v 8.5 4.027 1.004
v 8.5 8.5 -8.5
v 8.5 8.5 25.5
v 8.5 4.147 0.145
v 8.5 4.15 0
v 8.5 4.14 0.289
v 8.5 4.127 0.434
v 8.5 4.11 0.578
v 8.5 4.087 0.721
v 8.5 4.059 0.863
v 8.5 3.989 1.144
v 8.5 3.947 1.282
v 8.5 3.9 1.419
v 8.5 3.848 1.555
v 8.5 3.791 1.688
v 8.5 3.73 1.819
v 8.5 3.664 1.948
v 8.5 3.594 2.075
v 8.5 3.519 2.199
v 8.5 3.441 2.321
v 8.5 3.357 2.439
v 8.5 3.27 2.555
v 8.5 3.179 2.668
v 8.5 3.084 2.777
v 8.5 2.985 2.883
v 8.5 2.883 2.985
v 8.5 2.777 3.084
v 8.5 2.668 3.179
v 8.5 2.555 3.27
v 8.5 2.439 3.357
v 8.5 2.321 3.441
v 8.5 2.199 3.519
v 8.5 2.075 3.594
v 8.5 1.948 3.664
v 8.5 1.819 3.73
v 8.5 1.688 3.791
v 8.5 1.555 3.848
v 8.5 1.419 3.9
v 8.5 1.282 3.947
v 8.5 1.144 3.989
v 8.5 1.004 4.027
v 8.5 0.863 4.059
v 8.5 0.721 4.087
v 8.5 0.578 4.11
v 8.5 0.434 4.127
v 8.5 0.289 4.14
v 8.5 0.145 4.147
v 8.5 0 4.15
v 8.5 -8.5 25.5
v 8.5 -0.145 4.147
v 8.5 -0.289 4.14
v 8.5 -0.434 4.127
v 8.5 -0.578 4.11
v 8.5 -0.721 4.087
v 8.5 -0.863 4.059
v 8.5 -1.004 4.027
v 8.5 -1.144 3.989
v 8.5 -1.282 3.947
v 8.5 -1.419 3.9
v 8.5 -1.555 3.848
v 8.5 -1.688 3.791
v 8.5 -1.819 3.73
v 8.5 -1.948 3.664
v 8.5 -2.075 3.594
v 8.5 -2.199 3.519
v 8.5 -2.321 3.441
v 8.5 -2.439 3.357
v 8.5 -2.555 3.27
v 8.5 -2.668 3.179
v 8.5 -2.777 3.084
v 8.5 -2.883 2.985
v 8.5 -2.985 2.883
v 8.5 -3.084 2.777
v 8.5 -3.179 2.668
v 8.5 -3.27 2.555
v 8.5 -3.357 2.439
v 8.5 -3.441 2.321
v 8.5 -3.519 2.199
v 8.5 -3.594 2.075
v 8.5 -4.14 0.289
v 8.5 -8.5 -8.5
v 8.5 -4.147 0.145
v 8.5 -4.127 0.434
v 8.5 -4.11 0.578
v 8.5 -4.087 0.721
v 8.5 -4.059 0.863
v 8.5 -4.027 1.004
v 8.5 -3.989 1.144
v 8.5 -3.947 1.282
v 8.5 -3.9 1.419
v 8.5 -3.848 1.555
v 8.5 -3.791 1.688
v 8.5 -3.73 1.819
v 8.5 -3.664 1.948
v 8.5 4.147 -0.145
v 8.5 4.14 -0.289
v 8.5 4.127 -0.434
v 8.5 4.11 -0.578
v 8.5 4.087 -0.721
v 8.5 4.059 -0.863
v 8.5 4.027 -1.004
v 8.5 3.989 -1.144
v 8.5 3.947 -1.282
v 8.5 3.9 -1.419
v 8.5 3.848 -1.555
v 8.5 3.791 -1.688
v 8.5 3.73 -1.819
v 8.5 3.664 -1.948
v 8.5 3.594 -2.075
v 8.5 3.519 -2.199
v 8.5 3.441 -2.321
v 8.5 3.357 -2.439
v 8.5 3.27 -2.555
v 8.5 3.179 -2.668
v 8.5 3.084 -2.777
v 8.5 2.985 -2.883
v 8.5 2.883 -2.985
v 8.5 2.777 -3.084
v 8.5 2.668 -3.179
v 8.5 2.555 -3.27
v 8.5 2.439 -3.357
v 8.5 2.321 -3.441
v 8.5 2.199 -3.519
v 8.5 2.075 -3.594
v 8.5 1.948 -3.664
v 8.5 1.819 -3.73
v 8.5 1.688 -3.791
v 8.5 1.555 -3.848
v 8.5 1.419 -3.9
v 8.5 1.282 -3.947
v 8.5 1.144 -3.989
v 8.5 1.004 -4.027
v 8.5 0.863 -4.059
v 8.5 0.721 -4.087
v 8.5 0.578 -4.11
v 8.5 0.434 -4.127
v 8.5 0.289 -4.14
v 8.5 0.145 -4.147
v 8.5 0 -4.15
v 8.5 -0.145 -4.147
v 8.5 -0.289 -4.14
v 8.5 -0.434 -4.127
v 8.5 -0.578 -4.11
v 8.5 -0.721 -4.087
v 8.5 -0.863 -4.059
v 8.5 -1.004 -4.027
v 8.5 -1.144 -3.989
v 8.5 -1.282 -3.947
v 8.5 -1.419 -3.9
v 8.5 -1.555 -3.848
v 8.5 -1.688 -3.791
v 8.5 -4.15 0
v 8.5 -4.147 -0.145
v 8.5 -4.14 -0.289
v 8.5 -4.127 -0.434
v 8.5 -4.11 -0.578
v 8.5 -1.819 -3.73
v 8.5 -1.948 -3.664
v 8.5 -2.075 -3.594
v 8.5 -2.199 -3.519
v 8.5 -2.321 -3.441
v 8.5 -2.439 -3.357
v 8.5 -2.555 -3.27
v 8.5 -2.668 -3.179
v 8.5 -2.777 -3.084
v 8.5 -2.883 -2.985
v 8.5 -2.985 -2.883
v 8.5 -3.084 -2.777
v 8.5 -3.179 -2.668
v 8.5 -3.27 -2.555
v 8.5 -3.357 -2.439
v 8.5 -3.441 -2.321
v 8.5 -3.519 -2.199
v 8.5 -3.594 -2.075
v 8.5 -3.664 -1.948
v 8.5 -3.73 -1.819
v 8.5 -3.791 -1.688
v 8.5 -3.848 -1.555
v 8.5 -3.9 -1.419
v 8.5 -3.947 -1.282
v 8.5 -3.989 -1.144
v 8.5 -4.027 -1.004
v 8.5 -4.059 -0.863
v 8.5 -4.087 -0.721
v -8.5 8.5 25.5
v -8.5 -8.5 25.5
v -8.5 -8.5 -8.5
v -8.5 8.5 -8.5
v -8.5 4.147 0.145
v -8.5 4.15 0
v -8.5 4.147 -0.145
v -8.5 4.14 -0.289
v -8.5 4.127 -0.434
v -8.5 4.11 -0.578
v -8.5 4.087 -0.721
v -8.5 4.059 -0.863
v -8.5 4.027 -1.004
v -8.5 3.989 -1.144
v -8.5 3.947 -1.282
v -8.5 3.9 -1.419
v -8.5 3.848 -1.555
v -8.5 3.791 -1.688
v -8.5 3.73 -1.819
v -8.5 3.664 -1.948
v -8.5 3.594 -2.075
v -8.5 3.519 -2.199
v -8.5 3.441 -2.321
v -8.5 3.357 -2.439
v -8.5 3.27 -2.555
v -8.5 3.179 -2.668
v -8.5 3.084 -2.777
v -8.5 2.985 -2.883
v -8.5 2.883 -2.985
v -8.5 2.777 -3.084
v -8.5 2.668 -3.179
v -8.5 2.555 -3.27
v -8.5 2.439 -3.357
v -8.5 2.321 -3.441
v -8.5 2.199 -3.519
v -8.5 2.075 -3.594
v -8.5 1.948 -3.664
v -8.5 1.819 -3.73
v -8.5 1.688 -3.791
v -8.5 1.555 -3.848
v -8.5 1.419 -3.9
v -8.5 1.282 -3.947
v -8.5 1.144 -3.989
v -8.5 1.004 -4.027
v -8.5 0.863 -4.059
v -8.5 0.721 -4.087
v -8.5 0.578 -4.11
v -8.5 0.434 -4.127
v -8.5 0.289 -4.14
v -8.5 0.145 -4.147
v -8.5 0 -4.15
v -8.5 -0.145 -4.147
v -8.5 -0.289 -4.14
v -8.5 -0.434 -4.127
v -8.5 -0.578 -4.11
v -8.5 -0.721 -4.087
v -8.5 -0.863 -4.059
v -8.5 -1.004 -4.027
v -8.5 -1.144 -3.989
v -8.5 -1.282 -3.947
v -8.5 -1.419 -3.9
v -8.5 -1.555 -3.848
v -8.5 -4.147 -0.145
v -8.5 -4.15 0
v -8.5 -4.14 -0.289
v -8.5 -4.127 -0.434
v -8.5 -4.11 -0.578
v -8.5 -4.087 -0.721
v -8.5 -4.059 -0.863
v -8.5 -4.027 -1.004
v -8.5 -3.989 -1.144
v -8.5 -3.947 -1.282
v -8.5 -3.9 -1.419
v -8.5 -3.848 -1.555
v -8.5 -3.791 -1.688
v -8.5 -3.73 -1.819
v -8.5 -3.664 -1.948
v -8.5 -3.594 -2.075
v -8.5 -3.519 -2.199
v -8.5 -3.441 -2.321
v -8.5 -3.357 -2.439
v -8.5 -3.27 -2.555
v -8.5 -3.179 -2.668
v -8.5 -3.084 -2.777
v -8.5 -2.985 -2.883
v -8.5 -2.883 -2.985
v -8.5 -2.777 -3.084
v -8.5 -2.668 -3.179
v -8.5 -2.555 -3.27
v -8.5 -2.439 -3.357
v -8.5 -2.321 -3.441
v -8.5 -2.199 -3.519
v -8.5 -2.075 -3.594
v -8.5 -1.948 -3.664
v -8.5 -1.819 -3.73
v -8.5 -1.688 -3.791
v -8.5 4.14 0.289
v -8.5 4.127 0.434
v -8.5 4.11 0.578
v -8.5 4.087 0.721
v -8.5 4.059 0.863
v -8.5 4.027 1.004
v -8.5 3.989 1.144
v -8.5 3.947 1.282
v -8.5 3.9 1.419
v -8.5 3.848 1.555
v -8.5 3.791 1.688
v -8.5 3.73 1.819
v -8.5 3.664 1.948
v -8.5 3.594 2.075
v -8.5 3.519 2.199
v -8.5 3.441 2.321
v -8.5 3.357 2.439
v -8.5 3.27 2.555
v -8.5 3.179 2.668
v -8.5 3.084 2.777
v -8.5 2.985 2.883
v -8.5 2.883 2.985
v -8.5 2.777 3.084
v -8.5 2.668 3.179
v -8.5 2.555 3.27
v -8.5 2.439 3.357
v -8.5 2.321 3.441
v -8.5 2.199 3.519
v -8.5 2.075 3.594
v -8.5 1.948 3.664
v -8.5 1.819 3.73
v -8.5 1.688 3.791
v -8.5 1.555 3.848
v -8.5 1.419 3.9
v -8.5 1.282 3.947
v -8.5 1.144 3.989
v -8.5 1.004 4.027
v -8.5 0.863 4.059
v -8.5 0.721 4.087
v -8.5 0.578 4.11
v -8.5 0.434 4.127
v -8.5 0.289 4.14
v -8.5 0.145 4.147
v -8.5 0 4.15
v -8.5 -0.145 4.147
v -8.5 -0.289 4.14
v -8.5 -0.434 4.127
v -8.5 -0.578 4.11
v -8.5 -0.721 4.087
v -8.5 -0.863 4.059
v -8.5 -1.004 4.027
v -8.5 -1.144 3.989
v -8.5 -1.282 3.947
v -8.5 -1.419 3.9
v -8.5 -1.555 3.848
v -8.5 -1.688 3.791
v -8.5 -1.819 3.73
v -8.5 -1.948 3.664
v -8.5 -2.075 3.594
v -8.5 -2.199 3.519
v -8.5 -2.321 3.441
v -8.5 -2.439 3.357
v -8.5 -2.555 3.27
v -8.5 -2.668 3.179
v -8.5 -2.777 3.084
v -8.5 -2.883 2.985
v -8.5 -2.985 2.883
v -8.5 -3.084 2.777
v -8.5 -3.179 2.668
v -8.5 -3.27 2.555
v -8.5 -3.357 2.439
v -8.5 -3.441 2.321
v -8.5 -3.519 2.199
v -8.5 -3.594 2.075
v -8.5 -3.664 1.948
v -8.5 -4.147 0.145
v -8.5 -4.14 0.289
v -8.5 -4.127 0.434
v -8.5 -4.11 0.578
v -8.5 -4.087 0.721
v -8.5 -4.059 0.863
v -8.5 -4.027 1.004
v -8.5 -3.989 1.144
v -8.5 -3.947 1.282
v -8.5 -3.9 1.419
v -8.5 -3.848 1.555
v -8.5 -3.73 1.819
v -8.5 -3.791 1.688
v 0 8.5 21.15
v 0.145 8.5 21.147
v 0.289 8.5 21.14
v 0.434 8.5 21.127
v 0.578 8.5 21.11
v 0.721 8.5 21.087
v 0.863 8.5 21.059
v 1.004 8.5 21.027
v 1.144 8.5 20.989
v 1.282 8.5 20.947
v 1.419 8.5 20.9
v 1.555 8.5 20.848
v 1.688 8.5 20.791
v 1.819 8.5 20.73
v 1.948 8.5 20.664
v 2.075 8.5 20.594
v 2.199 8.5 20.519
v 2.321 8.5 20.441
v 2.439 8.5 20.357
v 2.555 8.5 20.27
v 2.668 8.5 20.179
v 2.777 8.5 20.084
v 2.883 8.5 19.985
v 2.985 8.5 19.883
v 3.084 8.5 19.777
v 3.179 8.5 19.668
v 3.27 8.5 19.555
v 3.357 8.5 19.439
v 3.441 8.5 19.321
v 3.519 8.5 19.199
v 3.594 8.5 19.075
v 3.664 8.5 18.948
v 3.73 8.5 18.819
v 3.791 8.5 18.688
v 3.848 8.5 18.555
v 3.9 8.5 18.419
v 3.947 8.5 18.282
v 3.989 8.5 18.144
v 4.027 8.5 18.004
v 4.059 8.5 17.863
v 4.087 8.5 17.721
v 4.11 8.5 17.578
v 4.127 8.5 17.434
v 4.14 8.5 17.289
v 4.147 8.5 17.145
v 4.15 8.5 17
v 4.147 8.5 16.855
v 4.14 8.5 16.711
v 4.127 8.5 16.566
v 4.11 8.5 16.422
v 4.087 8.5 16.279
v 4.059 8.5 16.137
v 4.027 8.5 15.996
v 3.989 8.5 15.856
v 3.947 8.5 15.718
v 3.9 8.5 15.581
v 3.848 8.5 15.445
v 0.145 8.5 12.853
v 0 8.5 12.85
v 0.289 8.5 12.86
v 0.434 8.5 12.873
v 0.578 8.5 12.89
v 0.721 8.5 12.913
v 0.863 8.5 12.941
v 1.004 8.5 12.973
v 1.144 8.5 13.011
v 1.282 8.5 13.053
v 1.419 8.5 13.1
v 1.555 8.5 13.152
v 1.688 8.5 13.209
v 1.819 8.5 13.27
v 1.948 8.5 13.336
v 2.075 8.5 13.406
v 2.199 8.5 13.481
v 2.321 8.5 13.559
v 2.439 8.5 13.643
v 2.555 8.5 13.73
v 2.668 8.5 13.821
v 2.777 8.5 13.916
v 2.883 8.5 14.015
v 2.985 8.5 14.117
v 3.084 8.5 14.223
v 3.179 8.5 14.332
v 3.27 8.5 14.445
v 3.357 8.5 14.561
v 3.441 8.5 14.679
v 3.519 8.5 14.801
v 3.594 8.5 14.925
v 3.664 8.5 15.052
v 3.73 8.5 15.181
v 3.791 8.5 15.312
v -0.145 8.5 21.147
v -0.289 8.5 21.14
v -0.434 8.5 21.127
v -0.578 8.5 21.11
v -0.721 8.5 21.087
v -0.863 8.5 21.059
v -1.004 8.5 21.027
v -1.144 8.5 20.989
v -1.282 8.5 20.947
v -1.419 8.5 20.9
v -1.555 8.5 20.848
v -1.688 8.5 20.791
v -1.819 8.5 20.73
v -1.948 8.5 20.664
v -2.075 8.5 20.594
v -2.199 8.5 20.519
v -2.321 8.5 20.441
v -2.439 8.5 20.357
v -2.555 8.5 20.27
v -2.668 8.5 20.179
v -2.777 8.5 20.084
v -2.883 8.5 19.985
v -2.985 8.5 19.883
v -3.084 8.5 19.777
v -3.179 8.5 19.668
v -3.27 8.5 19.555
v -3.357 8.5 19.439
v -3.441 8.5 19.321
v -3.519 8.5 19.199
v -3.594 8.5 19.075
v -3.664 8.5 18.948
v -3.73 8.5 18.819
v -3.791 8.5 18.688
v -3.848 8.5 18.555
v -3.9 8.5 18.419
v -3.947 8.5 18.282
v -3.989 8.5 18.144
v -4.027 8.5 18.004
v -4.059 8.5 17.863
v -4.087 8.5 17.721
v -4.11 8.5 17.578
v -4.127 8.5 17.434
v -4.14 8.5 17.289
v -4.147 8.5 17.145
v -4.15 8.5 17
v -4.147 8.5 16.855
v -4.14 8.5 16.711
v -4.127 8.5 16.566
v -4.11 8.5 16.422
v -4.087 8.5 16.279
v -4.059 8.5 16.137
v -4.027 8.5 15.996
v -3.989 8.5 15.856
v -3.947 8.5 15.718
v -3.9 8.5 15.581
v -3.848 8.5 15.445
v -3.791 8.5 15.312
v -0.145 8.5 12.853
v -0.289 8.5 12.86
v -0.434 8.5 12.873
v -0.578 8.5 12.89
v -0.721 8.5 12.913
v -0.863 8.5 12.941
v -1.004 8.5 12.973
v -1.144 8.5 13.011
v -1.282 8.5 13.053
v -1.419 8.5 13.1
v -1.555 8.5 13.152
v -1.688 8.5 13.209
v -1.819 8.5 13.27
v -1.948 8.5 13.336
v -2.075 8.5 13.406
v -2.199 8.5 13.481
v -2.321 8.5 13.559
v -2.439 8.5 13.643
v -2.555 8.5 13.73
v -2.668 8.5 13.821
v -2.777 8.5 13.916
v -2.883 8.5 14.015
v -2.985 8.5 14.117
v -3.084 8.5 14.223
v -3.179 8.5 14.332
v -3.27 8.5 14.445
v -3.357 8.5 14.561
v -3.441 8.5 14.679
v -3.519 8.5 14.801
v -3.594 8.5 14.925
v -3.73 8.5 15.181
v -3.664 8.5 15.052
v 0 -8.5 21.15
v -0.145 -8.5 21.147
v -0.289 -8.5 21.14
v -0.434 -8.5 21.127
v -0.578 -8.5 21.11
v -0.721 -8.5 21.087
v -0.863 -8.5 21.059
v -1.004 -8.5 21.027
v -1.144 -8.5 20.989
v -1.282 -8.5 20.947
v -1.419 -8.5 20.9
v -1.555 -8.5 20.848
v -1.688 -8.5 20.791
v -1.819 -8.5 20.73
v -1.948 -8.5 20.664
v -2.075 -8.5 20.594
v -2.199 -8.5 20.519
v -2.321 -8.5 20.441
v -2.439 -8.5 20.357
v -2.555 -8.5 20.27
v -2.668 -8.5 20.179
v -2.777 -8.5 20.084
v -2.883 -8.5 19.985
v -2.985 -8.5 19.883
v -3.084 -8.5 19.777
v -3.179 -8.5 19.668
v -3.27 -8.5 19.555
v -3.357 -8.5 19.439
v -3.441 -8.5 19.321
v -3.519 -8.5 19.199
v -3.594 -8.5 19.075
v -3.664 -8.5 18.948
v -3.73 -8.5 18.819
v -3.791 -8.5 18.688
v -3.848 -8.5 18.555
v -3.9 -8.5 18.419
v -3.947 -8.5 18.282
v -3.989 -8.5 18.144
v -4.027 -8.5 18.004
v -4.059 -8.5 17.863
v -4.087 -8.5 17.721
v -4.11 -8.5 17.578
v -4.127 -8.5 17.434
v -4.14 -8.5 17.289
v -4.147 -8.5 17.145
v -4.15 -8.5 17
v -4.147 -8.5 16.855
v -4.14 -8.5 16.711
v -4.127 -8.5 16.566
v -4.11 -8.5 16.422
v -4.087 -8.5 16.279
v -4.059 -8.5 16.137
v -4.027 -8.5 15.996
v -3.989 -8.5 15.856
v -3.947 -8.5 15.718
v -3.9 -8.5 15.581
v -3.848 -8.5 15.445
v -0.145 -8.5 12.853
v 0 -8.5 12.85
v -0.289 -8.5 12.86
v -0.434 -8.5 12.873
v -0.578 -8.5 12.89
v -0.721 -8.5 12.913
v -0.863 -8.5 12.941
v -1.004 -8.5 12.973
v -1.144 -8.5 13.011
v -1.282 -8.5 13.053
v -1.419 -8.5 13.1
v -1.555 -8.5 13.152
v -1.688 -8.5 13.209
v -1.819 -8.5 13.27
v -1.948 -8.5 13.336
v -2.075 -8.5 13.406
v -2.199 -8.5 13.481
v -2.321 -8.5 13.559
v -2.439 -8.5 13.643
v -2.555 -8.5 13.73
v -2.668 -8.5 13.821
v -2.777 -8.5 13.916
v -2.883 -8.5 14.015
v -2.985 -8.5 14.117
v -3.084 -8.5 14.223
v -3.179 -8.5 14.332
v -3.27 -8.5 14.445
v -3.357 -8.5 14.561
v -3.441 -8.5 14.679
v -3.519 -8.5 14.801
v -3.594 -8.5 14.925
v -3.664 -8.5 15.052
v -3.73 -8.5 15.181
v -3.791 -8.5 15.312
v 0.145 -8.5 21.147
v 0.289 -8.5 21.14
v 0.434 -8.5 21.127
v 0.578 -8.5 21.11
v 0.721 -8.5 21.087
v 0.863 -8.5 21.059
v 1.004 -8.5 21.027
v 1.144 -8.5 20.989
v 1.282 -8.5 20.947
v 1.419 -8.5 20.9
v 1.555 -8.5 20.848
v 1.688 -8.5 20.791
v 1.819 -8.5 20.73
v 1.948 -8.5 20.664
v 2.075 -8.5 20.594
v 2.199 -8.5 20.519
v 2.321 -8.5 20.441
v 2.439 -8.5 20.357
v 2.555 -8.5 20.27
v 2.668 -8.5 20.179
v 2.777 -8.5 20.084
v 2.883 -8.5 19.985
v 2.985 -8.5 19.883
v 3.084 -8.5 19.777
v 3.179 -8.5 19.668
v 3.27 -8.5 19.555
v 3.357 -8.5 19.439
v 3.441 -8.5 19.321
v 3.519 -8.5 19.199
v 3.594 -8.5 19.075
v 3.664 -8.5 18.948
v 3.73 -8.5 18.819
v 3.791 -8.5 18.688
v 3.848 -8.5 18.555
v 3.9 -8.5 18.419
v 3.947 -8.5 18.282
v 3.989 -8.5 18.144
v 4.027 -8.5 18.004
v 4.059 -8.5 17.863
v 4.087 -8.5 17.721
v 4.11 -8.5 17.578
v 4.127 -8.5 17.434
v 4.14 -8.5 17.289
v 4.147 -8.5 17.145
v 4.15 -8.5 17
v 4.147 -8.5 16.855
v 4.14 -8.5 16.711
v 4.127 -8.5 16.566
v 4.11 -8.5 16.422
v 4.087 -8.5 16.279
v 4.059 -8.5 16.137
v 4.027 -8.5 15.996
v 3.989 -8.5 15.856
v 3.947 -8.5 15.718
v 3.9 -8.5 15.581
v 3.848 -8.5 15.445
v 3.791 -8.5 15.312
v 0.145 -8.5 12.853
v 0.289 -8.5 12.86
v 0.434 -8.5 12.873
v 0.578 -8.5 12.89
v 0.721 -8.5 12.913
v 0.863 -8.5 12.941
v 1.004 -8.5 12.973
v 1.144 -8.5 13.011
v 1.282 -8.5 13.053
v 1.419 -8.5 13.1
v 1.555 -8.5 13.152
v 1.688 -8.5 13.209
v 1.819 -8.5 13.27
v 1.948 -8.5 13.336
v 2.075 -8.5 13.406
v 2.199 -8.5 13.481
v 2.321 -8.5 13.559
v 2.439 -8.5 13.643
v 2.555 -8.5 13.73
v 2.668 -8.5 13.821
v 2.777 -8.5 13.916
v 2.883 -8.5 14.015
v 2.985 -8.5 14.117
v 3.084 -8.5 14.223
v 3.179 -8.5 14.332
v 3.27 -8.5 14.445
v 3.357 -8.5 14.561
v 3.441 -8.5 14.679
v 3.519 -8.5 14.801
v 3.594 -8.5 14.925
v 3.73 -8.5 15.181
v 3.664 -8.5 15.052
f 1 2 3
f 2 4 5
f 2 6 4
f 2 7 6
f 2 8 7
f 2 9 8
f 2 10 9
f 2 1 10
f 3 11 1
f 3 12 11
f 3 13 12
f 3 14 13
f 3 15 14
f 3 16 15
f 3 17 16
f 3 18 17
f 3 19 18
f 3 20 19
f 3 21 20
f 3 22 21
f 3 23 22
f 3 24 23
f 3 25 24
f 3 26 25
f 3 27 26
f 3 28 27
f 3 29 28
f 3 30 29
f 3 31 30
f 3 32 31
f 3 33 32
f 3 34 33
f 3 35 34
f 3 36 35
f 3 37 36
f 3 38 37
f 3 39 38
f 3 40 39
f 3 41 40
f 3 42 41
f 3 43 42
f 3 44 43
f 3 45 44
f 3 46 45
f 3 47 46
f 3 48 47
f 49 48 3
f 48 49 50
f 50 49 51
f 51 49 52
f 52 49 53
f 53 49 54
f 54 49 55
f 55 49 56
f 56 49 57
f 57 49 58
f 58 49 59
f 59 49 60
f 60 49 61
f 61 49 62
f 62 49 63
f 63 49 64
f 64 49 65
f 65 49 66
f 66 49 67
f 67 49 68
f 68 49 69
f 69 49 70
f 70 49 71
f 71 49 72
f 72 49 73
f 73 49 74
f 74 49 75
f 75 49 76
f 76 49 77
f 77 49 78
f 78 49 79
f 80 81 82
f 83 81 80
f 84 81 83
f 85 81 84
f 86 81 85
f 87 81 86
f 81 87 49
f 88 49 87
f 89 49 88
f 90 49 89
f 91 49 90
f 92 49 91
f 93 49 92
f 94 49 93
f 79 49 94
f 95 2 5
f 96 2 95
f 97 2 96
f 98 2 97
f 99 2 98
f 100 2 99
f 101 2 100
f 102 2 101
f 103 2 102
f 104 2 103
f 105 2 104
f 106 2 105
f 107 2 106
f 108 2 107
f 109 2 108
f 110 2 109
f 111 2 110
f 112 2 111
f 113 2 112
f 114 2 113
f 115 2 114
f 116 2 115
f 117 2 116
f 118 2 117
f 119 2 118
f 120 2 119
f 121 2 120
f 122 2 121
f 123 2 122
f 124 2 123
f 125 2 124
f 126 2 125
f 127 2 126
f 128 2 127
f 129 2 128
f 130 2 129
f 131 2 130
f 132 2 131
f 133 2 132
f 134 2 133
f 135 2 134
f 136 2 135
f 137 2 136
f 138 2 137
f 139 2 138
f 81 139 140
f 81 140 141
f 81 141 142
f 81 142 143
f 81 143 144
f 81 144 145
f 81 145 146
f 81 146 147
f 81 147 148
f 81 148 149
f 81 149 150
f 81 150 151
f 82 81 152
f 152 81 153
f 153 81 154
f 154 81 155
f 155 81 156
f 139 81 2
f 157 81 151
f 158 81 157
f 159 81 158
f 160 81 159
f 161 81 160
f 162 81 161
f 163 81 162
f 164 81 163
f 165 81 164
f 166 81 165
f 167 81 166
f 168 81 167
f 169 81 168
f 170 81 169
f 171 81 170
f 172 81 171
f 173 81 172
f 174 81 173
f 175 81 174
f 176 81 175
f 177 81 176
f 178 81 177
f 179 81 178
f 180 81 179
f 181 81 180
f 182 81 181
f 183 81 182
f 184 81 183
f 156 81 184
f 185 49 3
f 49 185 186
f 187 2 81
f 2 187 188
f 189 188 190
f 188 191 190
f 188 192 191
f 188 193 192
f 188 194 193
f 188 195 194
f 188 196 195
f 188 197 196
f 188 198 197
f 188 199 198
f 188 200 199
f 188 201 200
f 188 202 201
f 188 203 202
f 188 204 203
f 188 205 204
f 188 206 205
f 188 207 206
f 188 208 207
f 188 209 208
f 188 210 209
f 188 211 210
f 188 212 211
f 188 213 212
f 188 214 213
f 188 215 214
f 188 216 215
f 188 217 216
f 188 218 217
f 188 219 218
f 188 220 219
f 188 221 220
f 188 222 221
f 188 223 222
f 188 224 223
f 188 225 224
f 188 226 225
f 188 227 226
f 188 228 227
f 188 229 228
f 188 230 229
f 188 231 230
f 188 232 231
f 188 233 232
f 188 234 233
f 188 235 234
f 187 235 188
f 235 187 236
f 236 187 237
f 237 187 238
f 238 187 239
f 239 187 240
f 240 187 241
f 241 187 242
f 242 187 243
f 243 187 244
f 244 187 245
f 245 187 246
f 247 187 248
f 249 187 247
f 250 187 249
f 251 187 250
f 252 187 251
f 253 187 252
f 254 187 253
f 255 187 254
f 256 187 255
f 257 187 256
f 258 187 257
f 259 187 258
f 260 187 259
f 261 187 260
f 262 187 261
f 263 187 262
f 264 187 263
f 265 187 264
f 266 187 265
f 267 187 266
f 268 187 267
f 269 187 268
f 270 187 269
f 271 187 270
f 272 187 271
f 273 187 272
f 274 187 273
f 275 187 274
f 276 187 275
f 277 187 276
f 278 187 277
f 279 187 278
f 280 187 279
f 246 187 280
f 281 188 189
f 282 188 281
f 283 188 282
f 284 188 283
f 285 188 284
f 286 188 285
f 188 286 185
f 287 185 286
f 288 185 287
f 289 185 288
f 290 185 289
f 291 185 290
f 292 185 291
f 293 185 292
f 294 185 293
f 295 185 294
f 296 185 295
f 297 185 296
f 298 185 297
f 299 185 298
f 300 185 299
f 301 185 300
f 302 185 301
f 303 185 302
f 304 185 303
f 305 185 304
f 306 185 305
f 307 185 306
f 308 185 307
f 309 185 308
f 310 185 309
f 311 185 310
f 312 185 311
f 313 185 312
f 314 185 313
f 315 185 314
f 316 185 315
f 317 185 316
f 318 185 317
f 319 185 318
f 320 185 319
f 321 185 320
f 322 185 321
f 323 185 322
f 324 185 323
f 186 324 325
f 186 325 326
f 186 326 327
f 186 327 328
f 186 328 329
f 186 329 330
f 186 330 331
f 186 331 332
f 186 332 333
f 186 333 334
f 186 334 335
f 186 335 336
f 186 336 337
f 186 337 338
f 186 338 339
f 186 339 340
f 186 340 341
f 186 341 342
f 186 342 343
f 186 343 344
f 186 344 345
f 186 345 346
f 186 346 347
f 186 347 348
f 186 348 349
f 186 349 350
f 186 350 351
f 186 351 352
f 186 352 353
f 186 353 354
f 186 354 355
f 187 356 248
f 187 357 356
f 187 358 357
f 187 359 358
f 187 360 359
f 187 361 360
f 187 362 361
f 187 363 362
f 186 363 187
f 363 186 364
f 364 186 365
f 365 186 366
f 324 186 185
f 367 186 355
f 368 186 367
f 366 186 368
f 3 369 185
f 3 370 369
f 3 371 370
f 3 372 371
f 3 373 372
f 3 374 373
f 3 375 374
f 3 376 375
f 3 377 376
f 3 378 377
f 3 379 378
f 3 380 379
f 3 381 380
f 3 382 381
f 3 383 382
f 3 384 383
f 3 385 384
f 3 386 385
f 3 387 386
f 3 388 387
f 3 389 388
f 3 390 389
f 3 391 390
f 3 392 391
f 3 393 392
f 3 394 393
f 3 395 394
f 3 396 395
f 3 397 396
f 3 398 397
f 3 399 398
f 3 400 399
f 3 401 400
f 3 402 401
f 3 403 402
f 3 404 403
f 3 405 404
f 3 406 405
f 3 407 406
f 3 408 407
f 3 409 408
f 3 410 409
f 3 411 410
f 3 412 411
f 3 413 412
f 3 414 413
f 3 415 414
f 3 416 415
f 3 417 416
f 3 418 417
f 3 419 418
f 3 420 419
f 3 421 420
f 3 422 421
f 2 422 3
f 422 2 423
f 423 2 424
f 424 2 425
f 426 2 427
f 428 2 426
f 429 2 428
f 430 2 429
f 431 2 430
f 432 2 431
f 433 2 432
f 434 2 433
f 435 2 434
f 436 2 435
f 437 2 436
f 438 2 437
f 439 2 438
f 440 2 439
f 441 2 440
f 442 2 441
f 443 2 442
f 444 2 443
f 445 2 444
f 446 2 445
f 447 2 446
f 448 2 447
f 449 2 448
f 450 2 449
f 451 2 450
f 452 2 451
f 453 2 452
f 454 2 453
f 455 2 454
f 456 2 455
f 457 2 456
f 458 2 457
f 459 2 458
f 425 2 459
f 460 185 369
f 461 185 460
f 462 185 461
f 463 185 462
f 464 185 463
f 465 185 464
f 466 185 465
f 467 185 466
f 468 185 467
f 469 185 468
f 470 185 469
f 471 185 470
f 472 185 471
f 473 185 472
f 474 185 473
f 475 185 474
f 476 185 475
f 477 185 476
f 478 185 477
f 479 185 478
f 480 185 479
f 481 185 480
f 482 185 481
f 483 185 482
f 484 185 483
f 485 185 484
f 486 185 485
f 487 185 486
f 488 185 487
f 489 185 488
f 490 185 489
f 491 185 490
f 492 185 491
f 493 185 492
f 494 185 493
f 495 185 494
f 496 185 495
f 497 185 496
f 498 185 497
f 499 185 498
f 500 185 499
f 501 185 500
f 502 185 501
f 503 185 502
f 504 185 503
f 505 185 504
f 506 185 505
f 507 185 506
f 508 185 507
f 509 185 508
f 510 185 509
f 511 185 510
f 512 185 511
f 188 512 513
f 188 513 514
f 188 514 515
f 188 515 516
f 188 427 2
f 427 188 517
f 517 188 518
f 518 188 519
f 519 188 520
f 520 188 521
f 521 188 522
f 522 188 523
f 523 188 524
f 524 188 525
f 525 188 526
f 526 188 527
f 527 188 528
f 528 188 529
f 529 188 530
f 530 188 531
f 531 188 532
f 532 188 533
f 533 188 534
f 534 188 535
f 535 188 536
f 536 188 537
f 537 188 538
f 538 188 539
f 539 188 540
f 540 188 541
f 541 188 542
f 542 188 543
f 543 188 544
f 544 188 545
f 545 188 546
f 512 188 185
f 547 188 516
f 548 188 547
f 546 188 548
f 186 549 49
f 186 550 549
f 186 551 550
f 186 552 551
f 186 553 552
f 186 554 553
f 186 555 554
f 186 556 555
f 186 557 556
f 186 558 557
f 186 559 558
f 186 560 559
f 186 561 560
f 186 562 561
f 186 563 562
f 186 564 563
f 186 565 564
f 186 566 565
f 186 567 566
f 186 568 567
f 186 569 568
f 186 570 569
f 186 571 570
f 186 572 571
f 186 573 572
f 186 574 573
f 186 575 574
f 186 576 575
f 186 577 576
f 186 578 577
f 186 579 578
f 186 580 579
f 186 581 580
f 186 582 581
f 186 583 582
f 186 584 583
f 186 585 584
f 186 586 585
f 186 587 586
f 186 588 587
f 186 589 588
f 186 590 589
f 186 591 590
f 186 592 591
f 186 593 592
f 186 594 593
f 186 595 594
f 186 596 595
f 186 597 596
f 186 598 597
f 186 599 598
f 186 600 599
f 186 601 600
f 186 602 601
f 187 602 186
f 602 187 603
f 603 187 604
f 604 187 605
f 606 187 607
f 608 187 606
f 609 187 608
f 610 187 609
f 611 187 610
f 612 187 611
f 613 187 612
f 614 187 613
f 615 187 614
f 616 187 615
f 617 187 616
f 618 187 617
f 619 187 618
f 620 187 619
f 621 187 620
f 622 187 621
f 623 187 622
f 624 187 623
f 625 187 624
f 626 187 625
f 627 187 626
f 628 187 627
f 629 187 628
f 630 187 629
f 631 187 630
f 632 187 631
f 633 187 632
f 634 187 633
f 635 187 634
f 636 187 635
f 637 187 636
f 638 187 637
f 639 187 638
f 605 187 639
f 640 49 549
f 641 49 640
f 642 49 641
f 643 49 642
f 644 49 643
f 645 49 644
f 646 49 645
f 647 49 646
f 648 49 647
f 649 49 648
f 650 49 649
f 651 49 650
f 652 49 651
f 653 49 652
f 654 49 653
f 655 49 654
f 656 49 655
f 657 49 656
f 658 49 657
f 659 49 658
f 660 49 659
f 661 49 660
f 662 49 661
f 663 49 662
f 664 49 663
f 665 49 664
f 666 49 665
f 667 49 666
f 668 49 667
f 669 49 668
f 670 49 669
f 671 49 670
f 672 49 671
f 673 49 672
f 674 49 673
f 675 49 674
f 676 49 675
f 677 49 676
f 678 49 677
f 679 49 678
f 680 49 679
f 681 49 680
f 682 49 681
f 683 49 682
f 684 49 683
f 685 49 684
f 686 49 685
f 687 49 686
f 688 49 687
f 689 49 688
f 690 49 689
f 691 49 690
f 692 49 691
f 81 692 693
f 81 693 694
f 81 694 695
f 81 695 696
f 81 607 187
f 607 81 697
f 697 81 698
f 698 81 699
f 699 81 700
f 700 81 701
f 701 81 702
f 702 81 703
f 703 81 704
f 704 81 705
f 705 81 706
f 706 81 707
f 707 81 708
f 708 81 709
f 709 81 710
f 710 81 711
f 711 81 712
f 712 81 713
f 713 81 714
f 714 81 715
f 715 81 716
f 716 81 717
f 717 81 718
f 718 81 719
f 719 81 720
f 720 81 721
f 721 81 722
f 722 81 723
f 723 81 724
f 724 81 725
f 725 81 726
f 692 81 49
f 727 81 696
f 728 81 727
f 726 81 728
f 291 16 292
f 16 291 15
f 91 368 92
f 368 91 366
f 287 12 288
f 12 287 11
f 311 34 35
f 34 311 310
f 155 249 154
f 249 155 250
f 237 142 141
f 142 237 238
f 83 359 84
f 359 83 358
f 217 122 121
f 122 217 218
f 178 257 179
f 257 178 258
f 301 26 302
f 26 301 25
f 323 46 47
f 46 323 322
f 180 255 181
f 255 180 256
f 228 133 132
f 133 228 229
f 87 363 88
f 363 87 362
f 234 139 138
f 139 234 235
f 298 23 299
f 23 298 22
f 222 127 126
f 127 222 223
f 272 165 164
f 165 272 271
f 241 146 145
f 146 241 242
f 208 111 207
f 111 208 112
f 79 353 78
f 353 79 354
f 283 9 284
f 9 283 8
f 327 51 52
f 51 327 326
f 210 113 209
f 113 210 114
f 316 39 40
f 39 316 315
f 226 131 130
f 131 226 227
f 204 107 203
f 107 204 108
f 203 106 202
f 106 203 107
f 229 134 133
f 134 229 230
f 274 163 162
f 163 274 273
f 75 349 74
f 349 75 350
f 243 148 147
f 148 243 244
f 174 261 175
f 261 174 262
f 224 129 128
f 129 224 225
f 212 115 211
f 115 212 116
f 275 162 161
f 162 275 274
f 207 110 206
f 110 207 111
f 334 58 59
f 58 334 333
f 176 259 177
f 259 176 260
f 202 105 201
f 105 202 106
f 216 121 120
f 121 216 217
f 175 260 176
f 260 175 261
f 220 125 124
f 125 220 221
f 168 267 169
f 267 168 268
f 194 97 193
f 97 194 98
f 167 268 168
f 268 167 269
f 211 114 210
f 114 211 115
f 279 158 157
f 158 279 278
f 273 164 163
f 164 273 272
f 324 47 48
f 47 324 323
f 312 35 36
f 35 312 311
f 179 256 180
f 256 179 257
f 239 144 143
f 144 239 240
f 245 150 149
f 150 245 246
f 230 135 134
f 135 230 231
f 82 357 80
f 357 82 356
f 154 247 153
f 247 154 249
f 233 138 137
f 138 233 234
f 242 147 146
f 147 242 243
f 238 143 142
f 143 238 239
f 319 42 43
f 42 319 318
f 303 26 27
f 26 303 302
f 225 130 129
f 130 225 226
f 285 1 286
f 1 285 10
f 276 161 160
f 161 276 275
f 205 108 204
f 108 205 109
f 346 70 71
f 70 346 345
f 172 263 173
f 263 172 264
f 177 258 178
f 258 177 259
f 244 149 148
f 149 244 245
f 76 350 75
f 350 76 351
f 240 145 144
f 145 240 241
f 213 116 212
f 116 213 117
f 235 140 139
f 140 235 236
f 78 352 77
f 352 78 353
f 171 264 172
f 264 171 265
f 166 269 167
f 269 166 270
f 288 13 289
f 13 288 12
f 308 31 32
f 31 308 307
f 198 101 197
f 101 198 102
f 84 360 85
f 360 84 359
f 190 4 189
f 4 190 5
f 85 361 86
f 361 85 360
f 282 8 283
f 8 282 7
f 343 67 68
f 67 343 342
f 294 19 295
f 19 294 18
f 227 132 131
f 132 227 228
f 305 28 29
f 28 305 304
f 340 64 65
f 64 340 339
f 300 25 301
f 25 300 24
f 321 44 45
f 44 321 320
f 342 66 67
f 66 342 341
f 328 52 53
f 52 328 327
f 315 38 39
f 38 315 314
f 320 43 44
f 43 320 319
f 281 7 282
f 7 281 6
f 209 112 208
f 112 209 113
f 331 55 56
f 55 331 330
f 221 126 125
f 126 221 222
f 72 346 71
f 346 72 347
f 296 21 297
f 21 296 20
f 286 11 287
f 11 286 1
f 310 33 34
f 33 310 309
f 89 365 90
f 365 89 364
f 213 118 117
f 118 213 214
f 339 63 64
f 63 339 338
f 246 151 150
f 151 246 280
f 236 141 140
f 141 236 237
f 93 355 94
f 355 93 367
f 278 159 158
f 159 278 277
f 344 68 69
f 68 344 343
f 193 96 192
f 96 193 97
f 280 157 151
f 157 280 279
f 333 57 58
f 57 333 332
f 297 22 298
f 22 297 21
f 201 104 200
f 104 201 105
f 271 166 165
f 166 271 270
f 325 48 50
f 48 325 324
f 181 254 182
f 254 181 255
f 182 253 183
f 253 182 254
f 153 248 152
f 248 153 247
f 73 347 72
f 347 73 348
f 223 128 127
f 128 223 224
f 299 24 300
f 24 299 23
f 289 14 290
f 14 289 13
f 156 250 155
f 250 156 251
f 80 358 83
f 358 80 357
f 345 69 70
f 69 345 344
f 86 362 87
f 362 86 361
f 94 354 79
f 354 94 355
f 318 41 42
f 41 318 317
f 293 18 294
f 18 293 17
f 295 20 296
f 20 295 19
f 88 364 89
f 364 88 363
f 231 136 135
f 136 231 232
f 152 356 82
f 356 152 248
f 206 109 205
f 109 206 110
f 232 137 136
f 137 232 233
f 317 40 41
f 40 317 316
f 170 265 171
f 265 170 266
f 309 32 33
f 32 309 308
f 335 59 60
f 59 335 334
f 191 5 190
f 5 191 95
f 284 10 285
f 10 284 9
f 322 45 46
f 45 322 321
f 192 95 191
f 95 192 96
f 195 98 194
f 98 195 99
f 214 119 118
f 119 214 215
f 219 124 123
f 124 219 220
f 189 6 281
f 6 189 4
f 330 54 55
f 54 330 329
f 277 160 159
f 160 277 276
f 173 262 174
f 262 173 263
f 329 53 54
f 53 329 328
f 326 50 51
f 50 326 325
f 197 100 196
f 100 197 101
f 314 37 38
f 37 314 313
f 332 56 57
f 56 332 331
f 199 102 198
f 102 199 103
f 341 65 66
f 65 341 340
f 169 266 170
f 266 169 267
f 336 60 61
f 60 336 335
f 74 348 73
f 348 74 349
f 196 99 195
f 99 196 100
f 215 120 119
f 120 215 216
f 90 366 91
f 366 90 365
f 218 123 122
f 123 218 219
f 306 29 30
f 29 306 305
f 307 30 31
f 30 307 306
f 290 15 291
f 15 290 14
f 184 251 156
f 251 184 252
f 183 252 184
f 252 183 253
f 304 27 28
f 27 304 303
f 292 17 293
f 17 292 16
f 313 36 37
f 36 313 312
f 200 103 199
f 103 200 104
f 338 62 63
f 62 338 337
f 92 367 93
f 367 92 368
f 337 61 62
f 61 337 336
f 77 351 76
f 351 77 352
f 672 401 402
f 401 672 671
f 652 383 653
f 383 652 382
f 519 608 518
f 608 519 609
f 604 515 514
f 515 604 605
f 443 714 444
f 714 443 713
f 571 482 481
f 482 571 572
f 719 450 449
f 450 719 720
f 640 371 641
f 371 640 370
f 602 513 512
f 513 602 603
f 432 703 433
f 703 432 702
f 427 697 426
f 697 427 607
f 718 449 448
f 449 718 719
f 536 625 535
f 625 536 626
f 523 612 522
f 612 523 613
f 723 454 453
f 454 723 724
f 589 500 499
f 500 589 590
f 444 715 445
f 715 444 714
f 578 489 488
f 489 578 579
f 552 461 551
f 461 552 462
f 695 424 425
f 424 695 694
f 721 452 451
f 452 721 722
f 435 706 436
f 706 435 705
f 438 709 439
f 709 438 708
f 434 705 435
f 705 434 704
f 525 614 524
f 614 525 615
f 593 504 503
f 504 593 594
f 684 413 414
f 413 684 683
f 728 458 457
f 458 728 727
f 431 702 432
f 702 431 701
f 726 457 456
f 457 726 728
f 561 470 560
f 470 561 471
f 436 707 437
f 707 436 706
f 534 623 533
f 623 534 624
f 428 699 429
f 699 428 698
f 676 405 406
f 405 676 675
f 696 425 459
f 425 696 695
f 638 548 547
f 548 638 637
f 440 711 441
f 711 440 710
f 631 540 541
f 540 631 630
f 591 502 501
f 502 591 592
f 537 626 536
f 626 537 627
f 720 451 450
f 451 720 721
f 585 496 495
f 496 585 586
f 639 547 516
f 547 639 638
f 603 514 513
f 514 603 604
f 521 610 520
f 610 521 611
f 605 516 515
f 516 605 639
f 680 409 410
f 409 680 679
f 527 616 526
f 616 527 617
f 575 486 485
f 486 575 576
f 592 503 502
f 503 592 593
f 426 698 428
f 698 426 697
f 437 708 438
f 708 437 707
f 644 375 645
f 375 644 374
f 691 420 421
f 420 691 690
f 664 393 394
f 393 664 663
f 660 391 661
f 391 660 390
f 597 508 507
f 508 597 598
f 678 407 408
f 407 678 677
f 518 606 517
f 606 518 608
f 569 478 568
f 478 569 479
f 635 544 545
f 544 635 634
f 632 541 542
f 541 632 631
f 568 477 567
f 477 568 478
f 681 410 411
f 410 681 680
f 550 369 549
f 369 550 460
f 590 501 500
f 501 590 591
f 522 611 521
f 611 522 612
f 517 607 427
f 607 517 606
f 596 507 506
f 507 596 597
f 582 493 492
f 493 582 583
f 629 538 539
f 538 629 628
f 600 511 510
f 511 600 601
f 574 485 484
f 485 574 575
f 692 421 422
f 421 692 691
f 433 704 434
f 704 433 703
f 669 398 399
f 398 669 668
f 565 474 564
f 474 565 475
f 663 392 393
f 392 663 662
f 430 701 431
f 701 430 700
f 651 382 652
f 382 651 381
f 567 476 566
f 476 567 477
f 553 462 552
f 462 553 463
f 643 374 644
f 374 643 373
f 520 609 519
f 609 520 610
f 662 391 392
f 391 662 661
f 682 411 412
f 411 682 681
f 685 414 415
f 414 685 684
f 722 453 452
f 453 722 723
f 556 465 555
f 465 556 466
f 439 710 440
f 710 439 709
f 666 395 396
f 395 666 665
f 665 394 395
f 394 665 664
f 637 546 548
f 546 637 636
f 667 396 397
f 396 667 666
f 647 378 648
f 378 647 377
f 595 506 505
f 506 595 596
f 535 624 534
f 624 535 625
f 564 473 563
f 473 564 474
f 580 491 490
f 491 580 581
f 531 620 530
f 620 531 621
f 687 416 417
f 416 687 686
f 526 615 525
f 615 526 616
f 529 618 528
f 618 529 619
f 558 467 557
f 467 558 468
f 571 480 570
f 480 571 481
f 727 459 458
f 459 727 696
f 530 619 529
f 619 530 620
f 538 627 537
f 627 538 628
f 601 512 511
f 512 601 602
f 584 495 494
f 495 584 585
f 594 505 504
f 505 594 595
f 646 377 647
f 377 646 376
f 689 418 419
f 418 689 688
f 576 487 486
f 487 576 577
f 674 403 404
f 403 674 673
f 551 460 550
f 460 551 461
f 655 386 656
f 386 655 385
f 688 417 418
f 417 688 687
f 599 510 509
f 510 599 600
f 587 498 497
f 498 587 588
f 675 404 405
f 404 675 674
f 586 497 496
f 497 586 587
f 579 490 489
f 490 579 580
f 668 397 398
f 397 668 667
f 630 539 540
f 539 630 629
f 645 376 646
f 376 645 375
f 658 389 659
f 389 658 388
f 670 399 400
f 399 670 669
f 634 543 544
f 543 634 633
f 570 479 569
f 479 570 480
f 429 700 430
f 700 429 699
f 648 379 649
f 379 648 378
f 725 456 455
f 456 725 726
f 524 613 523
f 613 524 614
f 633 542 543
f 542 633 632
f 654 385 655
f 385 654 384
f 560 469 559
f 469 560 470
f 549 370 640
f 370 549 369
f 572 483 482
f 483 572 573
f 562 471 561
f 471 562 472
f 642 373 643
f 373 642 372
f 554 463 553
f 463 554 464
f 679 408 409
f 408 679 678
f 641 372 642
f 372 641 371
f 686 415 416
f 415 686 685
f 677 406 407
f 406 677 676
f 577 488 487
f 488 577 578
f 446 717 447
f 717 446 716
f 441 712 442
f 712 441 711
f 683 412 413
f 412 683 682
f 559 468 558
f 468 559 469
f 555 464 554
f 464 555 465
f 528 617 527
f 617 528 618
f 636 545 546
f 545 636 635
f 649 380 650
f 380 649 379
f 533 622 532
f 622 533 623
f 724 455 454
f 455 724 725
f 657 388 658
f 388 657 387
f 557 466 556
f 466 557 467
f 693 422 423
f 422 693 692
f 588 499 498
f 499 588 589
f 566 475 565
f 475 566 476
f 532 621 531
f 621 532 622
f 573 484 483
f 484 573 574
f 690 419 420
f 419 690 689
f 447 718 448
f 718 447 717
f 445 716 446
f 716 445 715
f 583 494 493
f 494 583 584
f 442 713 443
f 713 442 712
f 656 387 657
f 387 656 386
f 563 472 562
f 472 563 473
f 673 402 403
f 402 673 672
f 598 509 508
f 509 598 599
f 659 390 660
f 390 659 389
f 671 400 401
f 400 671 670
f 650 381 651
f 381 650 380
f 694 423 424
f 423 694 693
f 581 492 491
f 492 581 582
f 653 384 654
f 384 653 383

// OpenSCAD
difference(){
translate([0,0,17/2])cube([17,17,17+17], center = true);
rotate([0,90,0]) cylinder(h = 50, d=8+0.3, $fn = 180, center = true);
 
   
    
    
translate([0,0,17])rotate([90,90,0]) cylinder(h = 50, d=8+0.3, $fn = 180, center = true);     
}    
